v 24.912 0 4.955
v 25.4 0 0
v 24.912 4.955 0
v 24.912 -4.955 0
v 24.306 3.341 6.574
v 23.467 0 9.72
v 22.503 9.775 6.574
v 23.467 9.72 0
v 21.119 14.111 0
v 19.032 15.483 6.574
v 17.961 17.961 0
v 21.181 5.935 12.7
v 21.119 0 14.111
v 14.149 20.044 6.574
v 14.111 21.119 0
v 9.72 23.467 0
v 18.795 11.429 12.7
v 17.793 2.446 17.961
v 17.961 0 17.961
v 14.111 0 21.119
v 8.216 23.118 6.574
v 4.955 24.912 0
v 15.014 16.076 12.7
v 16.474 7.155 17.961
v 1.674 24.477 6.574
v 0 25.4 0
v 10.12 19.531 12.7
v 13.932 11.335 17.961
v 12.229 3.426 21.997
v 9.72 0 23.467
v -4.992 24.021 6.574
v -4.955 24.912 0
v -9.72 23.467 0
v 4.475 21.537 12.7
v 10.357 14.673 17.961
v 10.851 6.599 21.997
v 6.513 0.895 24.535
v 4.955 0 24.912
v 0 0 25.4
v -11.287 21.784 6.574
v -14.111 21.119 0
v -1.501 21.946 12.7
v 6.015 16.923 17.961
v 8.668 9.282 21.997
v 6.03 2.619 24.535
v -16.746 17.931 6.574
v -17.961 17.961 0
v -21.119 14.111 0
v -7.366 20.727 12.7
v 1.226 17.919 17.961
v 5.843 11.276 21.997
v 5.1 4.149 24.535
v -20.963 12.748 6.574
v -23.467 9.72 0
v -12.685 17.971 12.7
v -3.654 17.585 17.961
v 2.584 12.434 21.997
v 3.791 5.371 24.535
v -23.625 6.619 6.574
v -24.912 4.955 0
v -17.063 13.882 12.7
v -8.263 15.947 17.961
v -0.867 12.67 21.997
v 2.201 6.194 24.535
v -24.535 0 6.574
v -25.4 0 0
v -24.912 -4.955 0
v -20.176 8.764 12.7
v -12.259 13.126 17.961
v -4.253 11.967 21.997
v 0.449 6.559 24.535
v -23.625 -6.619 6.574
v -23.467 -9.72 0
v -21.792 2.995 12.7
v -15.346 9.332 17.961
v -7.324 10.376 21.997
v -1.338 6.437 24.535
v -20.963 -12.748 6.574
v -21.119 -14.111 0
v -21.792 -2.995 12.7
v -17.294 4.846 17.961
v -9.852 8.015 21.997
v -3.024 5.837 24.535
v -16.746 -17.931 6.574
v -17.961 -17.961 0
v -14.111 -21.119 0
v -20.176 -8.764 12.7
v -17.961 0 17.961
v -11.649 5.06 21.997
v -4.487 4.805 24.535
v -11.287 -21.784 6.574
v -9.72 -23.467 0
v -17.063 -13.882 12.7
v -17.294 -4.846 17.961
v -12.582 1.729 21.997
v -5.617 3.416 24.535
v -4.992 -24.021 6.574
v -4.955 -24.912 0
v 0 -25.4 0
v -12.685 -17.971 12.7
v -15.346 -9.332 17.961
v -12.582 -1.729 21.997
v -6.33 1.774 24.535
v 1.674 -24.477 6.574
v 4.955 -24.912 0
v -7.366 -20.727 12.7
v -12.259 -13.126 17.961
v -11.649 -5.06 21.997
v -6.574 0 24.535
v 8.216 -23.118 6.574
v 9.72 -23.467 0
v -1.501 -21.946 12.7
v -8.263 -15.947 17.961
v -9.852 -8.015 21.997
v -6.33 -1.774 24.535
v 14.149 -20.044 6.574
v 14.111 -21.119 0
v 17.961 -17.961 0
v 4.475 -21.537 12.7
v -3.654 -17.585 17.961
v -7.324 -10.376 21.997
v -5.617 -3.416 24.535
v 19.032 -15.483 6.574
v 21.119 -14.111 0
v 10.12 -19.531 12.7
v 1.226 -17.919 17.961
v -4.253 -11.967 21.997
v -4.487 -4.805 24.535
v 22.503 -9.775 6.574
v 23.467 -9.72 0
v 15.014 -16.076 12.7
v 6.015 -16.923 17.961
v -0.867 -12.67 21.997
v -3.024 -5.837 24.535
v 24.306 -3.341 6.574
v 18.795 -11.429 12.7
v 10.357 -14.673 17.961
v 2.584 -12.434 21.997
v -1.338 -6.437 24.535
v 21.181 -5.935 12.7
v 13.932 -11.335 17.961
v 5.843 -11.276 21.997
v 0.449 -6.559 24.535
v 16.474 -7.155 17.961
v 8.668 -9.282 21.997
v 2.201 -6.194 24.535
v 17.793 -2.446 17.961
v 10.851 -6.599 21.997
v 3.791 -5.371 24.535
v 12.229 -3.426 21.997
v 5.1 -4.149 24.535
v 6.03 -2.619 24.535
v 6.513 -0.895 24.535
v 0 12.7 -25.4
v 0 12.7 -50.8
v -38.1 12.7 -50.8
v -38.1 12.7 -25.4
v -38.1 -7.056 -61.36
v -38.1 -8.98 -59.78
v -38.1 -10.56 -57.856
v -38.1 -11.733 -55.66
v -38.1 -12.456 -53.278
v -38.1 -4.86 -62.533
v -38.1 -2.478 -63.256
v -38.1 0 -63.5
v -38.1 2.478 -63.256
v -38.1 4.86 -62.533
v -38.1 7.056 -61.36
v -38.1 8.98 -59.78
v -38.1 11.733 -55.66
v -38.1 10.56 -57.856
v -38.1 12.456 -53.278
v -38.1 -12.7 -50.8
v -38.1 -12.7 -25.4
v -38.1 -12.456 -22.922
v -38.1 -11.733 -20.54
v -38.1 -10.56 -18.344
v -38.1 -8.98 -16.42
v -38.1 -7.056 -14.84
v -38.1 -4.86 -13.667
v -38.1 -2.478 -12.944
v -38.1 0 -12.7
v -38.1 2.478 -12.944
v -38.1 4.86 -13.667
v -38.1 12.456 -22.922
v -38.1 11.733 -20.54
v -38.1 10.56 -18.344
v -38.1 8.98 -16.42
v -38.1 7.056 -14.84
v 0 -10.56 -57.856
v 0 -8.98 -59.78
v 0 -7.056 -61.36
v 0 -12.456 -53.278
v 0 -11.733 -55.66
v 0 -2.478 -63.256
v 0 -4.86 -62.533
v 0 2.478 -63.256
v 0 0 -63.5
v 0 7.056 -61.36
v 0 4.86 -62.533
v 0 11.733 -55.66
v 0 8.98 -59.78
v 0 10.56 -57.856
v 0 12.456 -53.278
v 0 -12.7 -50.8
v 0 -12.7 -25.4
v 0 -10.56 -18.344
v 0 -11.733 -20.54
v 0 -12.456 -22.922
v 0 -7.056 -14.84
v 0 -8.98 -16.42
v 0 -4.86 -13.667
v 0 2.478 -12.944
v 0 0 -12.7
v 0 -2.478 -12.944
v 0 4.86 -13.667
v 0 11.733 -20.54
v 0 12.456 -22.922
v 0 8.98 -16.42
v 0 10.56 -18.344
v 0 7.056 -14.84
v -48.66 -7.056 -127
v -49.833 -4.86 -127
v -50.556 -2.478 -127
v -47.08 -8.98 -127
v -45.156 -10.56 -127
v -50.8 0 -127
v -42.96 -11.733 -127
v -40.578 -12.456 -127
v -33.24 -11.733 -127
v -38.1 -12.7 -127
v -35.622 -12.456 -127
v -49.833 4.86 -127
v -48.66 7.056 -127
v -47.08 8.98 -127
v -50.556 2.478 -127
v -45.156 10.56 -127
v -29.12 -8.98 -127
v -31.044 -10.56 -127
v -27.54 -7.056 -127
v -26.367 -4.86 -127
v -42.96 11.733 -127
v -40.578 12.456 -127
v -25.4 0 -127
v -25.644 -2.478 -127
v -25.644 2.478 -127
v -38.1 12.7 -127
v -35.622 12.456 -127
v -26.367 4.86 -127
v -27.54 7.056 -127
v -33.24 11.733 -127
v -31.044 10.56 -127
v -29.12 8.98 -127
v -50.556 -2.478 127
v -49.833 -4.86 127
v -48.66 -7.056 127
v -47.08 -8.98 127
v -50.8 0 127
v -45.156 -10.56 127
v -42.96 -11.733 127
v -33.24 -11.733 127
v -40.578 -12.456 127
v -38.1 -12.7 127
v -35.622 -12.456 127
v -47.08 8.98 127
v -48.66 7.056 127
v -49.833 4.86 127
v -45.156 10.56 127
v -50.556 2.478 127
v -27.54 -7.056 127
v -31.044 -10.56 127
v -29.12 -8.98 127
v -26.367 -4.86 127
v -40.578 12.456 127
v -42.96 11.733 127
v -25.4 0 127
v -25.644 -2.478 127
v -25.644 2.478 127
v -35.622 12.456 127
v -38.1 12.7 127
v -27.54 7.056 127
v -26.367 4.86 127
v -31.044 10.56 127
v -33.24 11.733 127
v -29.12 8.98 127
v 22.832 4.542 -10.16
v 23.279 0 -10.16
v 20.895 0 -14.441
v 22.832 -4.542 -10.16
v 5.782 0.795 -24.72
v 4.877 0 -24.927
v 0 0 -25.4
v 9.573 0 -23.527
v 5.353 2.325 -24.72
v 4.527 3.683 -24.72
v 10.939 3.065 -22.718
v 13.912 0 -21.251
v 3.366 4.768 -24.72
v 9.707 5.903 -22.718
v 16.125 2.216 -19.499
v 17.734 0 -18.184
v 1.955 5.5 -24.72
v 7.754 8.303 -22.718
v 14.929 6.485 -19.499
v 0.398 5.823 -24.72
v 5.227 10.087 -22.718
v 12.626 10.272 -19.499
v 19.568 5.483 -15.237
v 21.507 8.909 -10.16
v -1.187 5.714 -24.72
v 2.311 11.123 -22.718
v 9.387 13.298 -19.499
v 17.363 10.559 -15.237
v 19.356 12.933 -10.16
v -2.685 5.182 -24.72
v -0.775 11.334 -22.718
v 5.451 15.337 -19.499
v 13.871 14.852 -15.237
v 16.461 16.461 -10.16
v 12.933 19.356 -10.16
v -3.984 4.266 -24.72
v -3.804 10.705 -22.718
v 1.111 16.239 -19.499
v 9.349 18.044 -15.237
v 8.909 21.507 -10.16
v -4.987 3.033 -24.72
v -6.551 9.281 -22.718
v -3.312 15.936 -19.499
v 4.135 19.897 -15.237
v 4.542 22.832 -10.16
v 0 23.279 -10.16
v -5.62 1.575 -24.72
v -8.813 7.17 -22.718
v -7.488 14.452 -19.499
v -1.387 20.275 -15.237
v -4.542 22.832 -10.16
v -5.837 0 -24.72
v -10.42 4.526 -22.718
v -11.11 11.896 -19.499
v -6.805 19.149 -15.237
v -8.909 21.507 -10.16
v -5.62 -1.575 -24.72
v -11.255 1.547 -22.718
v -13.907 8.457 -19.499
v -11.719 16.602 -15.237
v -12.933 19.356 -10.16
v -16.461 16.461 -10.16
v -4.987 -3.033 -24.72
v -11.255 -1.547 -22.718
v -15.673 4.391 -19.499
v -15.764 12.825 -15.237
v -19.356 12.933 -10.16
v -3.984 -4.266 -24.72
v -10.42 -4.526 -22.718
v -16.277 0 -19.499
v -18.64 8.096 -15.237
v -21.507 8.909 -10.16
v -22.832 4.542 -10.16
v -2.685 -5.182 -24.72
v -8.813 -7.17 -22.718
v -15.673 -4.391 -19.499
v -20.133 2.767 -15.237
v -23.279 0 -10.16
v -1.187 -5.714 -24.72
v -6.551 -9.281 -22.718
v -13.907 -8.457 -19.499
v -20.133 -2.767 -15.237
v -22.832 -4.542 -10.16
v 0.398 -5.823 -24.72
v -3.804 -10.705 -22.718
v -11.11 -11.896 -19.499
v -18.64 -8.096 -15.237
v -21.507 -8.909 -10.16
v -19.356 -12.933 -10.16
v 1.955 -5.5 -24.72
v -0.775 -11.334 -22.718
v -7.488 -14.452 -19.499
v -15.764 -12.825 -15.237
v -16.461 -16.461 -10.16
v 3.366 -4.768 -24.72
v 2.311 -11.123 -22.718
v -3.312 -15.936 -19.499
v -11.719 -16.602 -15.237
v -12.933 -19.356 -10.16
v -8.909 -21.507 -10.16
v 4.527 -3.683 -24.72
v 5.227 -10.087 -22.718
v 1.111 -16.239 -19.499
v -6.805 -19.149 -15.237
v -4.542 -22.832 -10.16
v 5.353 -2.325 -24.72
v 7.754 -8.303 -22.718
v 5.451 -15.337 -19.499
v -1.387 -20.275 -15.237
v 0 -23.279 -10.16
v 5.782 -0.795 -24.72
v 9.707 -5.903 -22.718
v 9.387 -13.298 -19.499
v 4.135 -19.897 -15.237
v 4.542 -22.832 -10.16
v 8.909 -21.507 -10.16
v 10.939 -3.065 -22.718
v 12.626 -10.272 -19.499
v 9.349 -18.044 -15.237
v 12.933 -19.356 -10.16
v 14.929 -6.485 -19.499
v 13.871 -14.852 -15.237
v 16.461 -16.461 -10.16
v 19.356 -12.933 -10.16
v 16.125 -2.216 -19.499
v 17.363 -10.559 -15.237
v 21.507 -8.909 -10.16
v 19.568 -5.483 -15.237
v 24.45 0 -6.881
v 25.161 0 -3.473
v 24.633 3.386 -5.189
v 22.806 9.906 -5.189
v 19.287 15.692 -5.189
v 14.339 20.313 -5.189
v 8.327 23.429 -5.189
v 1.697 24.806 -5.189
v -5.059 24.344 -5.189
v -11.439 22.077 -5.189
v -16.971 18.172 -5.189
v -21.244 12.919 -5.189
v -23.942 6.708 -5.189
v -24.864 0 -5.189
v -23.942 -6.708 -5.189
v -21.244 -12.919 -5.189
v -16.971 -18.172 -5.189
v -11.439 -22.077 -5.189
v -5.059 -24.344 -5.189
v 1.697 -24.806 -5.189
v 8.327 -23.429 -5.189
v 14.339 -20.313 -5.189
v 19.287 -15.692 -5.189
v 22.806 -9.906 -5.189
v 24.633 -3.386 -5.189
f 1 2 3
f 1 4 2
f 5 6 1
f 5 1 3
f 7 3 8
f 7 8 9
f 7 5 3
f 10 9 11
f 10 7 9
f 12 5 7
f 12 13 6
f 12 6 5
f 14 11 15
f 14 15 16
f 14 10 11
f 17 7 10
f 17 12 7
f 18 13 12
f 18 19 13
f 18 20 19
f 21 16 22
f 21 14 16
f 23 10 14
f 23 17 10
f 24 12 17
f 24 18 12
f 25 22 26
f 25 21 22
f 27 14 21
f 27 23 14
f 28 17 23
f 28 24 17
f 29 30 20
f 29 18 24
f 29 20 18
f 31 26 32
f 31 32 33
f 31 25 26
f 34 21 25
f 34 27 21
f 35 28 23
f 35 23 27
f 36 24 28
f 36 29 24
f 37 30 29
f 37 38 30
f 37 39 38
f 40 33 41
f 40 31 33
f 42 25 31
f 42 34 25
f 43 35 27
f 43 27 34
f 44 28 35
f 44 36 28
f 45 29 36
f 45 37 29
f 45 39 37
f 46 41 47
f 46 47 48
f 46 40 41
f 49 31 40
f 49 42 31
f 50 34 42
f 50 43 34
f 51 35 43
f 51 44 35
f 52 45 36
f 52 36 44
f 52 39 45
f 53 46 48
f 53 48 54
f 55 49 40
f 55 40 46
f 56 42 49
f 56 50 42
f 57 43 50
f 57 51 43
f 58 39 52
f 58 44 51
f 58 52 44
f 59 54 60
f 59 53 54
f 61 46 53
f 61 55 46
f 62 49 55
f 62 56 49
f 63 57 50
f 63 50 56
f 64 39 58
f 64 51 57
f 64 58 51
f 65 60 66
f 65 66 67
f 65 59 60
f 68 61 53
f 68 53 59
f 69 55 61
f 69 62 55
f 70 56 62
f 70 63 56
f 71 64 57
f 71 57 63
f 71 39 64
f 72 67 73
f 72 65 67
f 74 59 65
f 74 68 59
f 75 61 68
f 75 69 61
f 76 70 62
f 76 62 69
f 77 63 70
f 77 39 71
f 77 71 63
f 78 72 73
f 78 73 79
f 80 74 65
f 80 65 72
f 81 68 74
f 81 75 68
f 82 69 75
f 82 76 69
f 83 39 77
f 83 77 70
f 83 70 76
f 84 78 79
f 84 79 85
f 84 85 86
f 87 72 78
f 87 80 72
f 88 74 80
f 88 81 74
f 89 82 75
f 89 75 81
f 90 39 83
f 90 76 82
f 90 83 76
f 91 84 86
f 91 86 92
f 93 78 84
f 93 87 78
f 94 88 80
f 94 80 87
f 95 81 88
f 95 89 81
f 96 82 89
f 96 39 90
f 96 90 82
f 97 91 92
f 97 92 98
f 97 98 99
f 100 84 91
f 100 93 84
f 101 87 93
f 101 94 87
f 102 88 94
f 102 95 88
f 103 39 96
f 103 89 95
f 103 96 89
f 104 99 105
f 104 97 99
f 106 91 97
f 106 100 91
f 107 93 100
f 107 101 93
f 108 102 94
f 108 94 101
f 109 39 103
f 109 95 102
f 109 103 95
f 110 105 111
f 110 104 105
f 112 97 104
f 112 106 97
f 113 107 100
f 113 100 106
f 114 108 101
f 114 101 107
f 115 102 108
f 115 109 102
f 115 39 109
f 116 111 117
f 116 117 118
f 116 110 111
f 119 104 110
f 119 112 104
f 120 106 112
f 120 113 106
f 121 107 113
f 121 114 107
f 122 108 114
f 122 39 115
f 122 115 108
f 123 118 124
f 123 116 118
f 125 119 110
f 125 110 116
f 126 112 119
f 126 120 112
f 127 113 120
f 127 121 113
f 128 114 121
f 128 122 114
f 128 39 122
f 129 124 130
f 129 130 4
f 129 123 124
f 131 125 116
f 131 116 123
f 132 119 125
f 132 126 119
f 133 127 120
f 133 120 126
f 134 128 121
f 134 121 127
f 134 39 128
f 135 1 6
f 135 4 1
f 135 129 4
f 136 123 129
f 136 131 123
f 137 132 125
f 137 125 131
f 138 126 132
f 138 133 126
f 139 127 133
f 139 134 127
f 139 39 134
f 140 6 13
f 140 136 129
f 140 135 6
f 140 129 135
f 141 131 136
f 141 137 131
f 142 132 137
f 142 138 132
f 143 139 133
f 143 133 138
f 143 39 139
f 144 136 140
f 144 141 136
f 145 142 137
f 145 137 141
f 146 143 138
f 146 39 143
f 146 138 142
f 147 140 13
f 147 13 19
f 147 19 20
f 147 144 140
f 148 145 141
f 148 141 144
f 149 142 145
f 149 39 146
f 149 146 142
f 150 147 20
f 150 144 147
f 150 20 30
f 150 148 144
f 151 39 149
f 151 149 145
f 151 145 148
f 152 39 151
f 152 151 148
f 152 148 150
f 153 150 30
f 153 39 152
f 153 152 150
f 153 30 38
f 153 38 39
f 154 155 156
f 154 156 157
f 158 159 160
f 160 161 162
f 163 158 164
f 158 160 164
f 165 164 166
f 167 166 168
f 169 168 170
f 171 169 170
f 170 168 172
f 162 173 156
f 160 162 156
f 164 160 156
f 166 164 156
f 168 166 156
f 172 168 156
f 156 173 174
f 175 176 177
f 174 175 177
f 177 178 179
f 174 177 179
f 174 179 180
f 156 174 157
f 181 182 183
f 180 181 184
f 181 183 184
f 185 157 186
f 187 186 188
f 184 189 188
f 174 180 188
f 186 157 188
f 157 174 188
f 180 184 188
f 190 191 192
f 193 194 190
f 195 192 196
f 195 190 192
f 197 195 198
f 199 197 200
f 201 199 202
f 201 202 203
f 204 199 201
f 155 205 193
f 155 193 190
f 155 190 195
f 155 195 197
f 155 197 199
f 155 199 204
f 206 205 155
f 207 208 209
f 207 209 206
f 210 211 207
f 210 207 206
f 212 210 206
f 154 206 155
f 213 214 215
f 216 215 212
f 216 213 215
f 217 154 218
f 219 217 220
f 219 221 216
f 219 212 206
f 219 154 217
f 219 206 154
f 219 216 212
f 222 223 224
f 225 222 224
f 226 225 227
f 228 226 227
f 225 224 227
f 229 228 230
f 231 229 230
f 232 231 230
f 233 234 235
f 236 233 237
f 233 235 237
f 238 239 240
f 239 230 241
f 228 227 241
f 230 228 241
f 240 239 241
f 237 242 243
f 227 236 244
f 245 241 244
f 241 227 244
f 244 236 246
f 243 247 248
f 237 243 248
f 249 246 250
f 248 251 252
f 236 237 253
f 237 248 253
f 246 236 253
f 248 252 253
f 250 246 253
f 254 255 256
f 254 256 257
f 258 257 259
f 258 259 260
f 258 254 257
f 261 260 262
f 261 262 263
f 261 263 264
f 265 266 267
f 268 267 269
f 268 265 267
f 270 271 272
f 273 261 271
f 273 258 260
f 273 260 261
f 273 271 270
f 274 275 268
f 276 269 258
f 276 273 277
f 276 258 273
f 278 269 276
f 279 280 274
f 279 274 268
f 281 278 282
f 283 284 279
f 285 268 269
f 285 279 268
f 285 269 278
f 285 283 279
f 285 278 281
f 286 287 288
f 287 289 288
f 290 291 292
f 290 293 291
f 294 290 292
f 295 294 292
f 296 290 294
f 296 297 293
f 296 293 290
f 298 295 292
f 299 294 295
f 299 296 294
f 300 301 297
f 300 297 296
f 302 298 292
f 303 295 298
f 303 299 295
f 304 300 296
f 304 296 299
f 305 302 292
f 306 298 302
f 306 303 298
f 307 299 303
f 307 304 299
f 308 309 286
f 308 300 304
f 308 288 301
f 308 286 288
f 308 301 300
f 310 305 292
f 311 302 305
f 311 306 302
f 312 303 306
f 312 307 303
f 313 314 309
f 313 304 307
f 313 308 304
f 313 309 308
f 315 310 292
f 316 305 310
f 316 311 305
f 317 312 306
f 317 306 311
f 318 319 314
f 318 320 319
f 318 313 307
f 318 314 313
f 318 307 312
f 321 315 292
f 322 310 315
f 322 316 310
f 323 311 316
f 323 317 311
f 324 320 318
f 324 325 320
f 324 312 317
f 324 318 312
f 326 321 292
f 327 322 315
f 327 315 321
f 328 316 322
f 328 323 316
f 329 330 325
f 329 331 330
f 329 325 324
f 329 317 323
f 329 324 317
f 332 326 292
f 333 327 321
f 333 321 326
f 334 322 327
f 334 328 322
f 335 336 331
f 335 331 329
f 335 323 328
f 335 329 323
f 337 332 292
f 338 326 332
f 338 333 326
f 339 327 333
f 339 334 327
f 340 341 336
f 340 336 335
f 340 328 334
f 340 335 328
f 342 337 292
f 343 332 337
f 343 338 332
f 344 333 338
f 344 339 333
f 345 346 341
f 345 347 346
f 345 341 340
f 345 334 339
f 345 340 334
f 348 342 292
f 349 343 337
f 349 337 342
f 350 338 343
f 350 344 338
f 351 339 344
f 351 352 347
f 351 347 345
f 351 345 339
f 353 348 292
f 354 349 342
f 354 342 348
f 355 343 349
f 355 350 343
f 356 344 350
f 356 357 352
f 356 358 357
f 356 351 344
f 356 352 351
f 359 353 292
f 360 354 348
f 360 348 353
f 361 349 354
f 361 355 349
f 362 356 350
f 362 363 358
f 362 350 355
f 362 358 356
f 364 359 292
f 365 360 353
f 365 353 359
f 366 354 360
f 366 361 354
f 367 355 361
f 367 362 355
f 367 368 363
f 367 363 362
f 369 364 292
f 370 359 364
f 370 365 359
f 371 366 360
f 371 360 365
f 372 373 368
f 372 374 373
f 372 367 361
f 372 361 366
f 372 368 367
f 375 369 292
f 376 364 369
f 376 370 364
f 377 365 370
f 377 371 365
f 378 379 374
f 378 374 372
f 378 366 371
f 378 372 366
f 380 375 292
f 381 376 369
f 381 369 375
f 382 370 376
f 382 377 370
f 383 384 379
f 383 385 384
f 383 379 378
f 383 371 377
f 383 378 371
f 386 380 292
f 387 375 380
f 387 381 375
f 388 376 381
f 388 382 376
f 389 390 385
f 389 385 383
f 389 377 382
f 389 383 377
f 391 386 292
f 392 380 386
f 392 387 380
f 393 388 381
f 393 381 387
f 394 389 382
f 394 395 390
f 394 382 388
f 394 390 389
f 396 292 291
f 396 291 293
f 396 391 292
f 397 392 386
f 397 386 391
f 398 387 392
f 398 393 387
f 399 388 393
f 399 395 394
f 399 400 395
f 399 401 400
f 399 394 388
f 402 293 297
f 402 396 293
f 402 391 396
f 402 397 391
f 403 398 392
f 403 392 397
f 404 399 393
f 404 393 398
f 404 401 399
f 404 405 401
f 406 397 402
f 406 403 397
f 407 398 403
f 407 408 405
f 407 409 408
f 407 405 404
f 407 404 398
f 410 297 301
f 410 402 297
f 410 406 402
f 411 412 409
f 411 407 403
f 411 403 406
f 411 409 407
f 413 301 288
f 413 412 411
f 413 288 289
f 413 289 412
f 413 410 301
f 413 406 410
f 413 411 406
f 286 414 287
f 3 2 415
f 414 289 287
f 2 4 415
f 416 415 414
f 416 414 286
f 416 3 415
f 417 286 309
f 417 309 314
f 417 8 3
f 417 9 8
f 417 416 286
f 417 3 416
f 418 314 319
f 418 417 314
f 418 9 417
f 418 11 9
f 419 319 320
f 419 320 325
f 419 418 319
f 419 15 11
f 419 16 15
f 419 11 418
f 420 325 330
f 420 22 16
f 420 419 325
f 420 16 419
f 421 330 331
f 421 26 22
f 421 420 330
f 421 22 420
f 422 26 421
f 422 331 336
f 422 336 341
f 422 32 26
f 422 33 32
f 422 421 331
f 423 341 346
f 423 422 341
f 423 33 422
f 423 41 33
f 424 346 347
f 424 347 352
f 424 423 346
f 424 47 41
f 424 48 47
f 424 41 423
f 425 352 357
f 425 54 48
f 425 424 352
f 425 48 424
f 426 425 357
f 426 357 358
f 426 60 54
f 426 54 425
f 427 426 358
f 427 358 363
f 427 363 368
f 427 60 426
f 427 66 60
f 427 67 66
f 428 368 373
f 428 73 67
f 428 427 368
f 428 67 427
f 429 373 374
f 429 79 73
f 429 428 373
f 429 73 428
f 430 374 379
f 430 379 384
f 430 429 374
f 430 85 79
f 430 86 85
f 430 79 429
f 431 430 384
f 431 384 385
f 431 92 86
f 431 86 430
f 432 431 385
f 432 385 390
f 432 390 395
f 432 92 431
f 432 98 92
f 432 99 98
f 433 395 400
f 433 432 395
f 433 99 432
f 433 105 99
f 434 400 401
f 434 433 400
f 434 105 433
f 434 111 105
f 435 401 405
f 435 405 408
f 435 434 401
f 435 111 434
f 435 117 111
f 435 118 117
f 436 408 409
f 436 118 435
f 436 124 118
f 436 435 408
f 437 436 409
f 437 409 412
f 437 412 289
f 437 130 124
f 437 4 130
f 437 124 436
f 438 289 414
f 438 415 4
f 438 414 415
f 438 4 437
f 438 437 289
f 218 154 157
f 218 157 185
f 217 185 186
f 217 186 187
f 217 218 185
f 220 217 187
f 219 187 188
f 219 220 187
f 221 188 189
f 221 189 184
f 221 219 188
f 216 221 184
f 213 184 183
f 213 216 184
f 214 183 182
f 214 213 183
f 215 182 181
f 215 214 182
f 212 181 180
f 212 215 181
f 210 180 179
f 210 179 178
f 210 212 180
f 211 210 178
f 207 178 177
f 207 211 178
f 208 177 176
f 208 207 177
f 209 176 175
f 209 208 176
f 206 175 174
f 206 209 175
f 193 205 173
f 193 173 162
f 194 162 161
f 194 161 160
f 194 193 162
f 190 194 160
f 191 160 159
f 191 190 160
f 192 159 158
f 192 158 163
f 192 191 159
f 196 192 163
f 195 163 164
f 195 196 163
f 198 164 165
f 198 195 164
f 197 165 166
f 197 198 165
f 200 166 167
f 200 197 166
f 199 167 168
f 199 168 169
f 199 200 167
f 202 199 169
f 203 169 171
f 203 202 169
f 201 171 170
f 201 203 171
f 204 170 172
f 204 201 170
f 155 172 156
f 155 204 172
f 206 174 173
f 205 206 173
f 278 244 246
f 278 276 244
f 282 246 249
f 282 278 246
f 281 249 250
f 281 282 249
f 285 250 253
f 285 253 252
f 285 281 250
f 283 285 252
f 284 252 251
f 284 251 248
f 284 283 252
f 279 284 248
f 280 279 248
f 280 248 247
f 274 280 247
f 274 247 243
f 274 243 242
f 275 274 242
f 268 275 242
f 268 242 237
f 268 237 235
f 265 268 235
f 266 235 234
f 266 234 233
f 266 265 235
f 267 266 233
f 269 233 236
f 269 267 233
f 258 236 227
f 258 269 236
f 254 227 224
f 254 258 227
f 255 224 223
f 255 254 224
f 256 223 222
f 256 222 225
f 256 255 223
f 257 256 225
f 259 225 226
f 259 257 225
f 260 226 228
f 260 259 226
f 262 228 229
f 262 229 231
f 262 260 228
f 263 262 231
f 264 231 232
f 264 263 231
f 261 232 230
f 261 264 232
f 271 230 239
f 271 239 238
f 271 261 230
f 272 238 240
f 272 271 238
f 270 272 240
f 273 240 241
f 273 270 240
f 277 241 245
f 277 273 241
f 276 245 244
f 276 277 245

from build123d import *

# Parameters (mm, degrees)
F0_R     = 12.7
F2_DEPTH = 127
F4_DEPTH = 38.1


# Not quite as in the source:
# - the program builds the solid bodies; features that only make, move or delete a surface that nothing else refers to are left out


with BuildPart() as f2:
    # F0 (on Top) → F2 (new body, symmetric)
    with BuildSketch(Plane.XY):
        with Locations((-38.1, 0)):
            Circle(F0_R)
    extrude(amount=F2_DEPTH, both=True)


with BuildPart() as f4:
    # F3 (on Right) → F4 (new body)
    with BuildSketch(Plane.YZ):
        with BuildLine():
            ThreePointArc((-12.7, -25.4), (0, -38.1), (12.7, -25.4))
            ThreePointArc((12.7, -25.4), (0, -12.7), (-12.7, -25.4))
        make_face()
        with BuildLine():
            Line((12.7, -50.8), (12.7, -25.4))
            ThreePointArc((12.7, -25.4), (0, -38.1), (-12.7, -25.4))
            Line((-12.7, -25.4), (-12.7, -50.8))
            Line((-12.7, -50.8), (12.7, -50.8))
        make_face()
        with BuildLine():
            ThreePointArc((-12.7, -50.8), (0, -63.5), (12.7, -50.8))
            Line((12.7, -50.8), (-12.7, -50.8))
        make_face()
    extrude(amount=-F4_DEPTH)


with BuildPart() as f8:
    # F7 (on Front) → F8 (revolve)
    with BuildSketch(Plane.XZ):
        with BuildLine():
            ThreePointArc((23.2794845304, -10.16), (24.8642203484, -5.1894649497), (25.4, 0))
            ThreePointArc((25.4, 0), (17.9605122421, 17.9605122421), (0, 25.4))
            Line((0, 25.4), (0, -10.16))
            Line((0, -10.16), (23.2794845304, -10.16))
        make_face()
        with BuildLine():
            ThreePointArc((0, -25.4), (13.9121529606, -21.251164674), (23.2794845304, -10.16))
            Line((23.2794845304, -10.16), (0, -10.16))
            Line((0, -10.16), (0, -25.4))
        make_face()
    revolve(axis=Axis((0, 0, 0), (0, 0, 1)))


solid = Compound([f2.part, f4.part, f8.part])
